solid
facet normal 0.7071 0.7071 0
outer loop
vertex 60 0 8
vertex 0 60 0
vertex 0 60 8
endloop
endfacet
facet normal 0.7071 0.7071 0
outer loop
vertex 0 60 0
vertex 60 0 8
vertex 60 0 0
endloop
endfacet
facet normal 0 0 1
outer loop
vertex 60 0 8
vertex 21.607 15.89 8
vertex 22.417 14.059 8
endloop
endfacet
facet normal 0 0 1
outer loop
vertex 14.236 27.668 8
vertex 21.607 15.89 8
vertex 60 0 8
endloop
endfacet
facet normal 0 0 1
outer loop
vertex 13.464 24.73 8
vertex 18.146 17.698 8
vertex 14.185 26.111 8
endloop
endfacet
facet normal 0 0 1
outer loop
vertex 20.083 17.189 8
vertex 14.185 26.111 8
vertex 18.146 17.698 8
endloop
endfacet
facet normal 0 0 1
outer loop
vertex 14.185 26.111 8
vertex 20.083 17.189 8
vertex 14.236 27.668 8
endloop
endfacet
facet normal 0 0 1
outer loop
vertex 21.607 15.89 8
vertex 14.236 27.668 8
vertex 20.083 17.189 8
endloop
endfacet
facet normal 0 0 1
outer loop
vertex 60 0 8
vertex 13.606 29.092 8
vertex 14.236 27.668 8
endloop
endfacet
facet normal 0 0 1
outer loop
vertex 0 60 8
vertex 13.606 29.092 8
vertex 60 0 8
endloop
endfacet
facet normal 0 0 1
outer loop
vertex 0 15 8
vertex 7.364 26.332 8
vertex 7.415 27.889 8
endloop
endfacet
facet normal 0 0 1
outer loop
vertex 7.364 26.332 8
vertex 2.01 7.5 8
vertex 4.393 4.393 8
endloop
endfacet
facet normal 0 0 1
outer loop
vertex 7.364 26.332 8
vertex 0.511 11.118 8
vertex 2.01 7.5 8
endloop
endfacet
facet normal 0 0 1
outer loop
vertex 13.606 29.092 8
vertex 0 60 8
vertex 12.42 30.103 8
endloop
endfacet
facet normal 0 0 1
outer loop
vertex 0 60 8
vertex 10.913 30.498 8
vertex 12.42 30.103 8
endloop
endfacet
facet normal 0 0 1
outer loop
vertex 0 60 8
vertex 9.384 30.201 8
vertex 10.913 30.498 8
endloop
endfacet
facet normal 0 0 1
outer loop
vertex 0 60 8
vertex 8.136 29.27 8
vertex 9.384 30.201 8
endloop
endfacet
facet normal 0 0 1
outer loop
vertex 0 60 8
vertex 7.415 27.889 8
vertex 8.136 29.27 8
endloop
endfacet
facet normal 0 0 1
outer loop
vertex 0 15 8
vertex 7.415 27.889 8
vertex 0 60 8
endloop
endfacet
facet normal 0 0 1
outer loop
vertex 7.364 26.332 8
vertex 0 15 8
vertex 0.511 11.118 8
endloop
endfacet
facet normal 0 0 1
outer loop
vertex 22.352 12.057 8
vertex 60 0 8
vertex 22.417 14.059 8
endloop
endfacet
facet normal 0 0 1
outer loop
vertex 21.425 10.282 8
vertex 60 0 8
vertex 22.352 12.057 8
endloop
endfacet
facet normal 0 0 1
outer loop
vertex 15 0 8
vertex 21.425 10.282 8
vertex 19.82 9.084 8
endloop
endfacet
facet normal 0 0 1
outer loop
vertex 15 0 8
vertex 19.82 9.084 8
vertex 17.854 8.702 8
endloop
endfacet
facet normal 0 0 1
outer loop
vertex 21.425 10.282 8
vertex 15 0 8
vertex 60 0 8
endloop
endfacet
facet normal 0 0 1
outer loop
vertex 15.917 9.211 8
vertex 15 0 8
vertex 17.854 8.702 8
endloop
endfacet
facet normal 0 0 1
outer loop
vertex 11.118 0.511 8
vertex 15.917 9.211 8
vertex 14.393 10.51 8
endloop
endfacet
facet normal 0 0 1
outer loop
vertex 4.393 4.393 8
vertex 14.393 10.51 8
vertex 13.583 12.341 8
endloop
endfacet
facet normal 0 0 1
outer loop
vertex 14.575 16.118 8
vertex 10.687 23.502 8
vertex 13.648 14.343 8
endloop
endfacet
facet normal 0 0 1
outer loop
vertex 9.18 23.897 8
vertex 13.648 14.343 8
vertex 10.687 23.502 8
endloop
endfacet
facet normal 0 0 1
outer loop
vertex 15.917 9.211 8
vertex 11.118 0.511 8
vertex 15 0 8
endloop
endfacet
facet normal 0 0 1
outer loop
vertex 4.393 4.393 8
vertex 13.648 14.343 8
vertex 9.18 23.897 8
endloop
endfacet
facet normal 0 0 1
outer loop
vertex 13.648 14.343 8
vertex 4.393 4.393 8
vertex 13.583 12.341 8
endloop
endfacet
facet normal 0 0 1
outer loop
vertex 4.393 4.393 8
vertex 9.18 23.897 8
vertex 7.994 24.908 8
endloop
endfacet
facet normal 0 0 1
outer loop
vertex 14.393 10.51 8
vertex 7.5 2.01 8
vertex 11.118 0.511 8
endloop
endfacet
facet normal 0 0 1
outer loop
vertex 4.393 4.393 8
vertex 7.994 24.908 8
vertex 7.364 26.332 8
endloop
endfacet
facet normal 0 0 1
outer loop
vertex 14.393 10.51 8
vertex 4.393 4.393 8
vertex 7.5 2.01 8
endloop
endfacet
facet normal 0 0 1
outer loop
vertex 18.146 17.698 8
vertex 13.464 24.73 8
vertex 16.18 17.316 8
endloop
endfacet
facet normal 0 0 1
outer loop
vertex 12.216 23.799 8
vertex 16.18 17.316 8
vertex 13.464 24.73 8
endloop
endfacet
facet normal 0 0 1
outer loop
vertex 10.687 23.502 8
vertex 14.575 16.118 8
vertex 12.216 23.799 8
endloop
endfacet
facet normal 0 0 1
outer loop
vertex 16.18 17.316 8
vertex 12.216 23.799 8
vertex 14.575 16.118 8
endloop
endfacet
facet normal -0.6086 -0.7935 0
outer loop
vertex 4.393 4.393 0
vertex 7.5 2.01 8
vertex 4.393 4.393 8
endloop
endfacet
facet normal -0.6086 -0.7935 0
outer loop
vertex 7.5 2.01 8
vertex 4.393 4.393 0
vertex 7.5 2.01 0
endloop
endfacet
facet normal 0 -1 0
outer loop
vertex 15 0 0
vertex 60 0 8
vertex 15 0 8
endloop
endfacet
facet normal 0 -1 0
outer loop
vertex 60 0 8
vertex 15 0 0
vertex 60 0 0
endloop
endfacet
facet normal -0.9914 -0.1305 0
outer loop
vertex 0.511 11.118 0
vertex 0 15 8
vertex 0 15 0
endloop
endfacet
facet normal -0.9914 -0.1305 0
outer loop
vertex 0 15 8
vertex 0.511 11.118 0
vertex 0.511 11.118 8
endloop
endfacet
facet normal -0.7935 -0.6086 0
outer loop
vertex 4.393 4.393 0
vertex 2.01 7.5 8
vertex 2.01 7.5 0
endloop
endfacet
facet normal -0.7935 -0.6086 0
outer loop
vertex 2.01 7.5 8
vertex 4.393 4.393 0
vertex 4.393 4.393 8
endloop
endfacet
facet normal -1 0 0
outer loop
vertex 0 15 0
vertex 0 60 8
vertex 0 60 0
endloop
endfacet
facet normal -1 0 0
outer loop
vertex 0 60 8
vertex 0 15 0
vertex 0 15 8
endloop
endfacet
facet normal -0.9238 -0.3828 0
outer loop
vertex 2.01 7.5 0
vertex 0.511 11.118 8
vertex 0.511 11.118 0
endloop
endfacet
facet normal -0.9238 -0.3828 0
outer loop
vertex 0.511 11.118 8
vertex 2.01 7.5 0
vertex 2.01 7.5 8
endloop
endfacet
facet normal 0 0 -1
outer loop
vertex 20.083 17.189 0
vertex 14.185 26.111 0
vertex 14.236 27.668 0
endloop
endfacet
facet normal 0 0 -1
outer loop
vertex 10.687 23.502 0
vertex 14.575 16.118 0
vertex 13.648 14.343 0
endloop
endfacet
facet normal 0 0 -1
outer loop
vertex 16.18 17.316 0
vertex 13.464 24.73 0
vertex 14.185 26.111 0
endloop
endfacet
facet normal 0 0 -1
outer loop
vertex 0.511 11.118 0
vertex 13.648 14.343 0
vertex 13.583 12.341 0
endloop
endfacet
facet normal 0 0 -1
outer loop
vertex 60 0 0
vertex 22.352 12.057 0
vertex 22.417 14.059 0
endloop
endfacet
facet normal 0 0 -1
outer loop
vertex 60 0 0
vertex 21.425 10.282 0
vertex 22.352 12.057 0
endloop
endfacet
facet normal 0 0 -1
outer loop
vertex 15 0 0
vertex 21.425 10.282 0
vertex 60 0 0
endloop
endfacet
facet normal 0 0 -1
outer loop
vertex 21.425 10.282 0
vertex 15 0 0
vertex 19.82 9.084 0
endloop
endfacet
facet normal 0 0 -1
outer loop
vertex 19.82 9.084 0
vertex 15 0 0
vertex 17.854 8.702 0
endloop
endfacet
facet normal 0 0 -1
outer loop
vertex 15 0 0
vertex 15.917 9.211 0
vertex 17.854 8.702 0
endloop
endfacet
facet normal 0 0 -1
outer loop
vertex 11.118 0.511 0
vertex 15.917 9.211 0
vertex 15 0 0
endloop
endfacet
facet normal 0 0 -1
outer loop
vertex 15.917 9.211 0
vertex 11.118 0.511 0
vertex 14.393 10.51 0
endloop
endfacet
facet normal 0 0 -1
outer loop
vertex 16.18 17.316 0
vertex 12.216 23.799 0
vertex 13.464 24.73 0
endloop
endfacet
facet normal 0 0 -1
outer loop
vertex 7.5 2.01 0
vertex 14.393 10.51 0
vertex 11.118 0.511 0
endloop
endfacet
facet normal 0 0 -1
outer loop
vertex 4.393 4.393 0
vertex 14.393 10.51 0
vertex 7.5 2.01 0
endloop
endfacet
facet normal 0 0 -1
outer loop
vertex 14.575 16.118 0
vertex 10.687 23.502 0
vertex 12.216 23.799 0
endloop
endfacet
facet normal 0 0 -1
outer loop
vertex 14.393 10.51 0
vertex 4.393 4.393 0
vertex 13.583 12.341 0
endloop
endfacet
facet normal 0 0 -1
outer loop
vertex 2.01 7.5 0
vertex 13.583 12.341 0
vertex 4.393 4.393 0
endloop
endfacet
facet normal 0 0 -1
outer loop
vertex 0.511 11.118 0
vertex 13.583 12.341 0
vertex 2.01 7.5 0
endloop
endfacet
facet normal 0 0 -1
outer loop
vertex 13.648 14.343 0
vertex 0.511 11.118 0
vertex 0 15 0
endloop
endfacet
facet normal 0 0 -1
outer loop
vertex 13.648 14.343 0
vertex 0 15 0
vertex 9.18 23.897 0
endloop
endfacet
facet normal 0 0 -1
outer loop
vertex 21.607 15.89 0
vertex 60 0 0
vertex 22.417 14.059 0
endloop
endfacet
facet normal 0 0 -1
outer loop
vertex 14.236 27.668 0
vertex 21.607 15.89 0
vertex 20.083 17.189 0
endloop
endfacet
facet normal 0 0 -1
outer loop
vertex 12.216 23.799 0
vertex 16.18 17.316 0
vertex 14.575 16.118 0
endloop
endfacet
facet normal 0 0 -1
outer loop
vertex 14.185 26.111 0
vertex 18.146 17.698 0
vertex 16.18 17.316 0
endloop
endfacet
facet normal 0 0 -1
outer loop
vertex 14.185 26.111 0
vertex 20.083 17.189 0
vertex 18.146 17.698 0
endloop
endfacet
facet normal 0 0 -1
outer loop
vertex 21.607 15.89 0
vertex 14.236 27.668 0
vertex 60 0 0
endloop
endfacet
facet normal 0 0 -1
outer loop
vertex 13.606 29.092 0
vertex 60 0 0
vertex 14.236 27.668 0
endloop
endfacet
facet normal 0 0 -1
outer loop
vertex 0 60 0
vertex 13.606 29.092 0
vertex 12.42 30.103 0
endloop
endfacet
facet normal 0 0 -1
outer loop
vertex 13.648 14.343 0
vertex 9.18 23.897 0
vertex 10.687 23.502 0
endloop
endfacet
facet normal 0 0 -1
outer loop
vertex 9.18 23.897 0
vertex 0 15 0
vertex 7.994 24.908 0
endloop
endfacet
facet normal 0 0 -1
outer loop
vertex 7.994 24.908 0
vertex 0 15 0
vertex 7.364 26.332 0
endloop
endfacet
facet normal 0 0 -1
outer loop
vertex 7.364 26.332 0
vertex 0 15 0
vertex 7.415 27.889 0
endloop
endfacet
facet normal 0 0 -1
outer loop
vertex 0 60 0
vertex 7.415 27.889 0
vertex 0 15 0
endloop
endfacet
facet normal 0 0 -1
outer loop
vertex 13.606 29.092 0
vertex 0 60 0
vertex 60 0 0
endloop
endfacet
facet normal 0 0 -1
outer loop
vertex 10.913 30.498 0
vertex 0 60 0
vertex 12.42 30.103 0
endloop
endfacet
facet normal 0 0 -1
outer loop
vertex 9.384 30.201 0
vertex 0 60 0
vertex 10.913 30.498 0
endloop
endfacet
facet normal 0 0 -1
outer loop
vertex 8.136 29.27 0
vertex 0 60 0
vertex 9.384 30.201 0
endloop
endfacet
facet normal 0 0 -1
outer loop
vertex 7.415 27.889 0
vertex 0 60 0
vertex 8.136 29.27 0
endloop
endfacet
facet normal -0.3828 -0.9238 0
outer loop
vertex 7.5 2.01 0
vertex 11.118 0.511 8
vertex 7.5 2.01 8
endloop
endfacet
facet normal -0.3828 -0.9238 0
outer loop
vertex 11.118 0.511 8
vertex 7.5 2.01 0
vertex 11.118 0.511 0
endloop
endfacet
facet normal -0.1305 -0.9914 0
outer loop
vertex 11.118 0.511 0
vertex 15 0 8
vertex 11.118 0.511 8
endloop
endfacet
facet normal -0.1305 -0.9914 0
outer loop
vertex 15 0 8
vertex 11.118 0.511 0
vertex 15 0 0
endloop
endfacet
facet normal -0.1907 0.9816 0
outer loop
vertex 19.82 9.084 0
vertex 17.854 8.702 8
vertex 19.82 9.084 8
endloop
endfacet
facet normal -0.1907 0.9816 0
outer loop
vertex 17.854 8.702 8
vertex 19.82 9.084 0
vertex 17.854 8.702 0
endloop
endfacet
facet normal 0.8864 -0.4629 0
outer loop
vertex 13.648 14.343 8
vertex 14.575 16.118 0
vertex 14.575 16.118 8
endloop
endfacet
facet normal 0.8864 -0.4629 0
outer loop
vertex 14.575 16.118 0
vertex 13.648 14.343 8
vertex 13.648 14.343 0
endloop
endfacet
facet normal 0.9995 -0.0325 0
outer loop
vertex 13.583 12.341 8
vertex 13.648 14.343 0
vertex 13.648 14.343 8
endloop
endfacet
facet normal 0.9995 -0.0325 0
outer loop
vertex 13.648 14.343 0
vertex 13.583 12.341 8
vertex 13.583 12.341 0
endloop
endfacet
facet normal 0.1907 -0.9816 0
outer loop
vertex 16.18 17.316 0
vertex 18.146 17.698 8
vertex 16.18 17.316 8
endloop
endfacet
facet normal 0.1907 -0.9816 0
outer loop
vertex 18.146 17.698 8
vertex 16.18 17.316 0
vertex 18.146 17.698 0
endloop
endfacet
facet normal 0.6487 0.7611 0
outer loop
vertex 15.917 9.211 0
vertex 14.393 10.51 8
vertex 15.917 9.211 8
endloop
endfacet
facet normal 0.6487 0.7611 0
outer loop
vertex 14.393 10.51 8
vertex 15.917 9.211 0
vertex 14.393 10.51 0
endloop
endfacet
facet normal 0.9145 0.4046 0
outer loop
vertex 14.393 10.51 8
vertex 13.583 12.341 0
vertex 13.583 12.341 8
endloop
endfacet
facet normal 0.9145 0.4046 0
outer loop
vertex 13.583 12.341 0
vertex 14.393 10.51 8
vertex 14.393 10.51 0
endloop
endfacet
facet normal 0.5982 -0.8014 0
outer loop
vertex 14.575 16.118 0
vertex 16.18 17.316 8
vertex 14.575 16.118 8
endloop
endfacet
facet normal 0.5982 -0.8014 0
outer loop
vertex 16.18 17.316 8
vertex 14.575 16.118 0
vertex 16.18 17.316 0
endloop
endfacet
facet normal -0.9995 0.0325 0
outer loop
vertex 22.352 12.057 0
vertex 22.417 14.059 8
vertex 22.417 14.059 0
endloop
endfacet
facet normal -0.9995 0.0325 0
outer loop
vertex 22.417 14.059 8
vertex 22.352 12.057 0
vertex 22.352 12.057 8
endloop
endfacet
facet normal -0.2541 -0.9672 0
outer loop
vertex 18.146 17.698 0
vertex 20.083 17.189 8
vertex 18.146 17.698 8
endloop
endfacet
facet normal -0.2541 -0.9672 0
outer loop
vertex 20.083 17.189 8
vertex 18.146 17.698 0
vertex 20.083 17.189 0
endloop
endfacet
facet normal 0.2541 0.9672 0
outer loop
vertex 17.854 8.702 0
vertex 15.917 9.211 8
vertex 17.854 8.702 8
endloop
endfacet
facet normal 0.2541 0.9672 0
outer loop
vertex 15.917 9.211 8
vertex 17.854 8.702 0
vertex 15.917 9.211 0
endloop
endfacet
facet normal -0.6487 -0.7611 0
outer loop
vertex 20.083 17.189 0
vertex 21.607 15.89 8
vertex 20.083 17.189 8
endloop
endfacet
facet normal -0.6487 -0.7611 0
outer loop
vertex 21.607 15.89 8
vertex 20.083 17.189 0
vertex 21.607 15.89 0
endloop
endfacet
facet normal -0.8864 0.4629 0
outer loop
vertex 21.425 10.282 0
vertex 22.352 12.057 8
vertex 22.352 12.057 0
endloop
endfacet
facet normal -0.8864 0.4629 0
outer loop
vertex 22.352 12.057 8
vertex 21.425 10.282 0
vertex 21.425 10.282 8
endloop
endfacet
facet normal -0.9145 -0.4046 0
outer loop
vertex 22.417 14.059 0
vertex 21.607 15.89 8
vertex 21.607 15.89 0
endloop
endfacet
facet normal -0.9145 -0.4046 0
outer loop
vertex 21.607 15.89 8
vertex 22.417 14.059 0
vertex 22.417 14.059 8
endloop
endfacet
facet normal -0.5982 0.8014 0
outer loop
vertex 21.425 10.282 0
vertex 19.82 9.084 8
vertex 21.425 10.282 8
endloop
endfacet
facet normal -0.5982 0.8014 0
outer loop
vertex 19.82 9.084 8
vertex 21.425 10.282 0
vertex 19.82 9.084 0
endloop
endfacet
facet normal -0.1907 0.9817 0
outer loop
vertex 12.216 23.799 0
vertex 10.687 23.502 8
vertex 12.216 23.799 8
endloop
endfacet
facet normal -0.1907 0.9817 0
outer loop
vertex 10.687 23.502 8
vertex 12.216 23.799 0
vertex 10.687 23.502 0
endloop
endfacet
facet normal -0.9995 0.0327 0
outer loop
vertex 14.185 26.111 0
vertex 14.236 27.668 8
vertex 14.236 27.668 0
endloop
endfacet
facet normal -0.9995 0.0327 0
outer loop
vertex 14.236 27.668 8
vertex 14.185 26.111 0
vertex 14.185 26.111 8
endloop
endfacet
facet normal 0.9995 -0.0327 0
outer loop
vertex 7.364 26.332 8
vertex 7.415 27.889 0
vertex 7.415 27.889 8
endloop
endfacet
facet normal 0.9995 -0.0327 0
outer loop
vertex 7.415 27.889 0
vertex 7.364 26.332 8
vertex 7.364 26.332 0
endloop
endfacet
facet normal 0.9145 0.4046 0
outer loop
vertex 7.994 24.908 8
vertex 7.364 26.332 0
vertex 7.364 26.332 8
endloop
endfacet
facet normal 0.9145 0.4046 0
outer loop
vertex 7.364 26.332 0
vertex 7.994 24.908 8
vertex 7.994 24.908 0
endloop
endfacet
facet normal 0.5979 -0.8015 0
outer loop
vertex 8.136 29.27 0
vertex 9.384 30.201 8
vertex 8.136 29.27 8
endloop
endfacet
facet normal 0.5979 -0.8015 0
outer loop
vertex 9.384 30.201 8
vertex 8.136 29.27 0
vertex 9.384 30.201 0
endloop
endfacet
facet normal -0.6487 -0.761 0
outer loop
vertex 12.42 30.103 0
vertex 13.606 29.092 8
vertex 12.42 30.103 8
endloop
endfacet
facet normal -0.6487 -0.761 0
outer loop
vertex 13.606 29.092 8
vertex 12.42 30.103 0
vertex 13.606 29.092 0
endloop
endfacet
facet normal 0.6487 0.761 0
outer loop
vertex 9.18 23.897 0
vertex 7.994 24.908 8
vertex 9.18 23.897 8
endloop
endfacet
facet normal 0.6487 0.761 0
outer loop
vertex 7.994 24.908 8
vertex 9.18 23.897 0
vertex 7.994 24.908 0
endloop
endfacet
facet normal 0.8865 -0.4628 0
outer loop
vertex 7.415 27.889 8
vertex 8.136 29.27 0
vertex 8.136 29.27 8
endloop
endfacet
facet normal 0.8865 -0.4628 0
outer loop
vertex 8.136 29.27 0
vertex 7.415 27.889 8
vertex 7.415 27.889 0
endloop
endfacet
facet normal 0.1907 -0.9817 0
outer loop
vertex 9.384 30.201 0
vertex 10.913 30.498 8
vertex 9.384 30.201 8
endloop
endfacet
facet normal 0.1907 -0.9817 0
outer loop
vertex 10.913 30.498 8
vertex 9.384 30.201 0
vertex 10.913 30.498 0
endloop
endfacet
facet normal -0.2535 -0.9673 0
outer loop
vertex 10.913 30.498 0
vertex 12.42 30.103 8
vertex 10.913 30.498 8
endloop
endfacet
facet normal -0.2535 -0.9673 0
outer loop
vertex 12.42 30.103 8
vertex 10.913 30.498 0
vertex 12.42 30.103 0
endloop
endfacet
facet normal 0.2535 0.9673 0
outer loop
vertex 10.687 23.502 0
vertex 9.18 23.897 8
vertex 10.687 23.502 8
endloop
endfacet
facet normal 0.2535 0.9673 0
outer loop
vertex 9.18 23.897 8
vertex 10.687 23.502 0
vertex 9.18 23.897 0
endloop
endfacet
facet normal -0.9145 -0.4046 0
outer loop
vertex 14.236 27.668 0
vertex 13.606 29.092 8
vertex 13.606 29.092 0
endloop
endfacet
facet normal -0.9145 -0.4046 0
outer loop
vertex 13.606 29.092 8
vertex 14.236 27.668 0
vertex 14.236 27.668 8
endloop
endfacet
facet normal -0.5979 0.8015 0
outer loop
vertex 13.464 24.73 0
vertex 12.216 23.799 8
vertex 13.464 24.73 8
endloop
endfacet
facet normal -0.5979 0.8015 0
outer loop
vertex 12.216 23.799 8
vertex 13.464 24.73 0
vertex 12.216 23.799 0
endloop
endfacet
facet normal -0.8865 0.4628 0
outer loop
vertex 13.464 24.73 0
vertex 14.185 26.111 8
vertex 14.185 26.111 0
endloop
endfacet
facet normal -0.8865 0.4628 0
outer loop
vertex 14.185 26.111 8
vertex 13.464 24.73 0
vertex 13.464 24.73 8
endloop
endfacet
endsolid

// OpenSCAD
$fn = 32;

// ----------------------------------------------------------------------
// Bracket plate: corner pad 60 x 60, fillet R15
// ----------------------------------------------------------------------

// --- parameters (mm) ---
hole_r = 3.5;             // bolt hole radius
plate_t = 8;              // plate thickness, Z (extrusion height)
leg_a = 60;               // base leg
leg_b = 60;               // height leg
fillet_r = 15;            // right-angle fillet radius
fit_tol = 0.05;           // declared fit tolerance (prompt contract)
free_tol = 0.3;           // declared free tolerance (prompt contract)

hole_d1 = 2 * hole_r + 2;
hole_d2 = 2 * hole_r;

profile = [[15, 0], [60, 0], [0, 60], [0, 15], [0.511, 11.118], [2.01, 7.5], [4.393, 4.393], [7.5, 2.01], [11.118, 0.511]];  // primary outline, 9 points, counter clockwise
void_1 = [[22.417, 14.059], [21.607, 15.89], [20.083, 17.189], [18.146, 17.698], [16.18, 17.316], [14.575, 16.118], [13.648, 14.343], [13.583, 12.341], [14.393, 10.51], [15.917, 9.211], [17.854, 8.702], [19.82, 9.084], [21.425, 10.282], [22.352, 12.057]];  // mount hole 1, 14 points
void_2 = [[14.236, 27.668], [13.606, 29.092], [12.42, 30.103], [10.913, 30.498], [9.384, 30.201], [8.136, 29.27], [7.415, 27.889], [7.364, 26.332], [7.994, 24.908], [9.18, 23.897], [10.687, 23.502], [12.216, 23.799], [13.464, 24.73], [14.185, 26.111]];  // mount hole 2, 14 points

// --- the one profile operation ---
difference() {
  linear_extrude(height = plate_t) polygon(points = profile);
  translate([0, 0, -1])
    linear_extrude(height = plate_t + 2) polygon(points = void_1);
  translate([0, 0, -1])
    linear_extrude(height = plate_t + 2) polygon(points = void_2);
}
